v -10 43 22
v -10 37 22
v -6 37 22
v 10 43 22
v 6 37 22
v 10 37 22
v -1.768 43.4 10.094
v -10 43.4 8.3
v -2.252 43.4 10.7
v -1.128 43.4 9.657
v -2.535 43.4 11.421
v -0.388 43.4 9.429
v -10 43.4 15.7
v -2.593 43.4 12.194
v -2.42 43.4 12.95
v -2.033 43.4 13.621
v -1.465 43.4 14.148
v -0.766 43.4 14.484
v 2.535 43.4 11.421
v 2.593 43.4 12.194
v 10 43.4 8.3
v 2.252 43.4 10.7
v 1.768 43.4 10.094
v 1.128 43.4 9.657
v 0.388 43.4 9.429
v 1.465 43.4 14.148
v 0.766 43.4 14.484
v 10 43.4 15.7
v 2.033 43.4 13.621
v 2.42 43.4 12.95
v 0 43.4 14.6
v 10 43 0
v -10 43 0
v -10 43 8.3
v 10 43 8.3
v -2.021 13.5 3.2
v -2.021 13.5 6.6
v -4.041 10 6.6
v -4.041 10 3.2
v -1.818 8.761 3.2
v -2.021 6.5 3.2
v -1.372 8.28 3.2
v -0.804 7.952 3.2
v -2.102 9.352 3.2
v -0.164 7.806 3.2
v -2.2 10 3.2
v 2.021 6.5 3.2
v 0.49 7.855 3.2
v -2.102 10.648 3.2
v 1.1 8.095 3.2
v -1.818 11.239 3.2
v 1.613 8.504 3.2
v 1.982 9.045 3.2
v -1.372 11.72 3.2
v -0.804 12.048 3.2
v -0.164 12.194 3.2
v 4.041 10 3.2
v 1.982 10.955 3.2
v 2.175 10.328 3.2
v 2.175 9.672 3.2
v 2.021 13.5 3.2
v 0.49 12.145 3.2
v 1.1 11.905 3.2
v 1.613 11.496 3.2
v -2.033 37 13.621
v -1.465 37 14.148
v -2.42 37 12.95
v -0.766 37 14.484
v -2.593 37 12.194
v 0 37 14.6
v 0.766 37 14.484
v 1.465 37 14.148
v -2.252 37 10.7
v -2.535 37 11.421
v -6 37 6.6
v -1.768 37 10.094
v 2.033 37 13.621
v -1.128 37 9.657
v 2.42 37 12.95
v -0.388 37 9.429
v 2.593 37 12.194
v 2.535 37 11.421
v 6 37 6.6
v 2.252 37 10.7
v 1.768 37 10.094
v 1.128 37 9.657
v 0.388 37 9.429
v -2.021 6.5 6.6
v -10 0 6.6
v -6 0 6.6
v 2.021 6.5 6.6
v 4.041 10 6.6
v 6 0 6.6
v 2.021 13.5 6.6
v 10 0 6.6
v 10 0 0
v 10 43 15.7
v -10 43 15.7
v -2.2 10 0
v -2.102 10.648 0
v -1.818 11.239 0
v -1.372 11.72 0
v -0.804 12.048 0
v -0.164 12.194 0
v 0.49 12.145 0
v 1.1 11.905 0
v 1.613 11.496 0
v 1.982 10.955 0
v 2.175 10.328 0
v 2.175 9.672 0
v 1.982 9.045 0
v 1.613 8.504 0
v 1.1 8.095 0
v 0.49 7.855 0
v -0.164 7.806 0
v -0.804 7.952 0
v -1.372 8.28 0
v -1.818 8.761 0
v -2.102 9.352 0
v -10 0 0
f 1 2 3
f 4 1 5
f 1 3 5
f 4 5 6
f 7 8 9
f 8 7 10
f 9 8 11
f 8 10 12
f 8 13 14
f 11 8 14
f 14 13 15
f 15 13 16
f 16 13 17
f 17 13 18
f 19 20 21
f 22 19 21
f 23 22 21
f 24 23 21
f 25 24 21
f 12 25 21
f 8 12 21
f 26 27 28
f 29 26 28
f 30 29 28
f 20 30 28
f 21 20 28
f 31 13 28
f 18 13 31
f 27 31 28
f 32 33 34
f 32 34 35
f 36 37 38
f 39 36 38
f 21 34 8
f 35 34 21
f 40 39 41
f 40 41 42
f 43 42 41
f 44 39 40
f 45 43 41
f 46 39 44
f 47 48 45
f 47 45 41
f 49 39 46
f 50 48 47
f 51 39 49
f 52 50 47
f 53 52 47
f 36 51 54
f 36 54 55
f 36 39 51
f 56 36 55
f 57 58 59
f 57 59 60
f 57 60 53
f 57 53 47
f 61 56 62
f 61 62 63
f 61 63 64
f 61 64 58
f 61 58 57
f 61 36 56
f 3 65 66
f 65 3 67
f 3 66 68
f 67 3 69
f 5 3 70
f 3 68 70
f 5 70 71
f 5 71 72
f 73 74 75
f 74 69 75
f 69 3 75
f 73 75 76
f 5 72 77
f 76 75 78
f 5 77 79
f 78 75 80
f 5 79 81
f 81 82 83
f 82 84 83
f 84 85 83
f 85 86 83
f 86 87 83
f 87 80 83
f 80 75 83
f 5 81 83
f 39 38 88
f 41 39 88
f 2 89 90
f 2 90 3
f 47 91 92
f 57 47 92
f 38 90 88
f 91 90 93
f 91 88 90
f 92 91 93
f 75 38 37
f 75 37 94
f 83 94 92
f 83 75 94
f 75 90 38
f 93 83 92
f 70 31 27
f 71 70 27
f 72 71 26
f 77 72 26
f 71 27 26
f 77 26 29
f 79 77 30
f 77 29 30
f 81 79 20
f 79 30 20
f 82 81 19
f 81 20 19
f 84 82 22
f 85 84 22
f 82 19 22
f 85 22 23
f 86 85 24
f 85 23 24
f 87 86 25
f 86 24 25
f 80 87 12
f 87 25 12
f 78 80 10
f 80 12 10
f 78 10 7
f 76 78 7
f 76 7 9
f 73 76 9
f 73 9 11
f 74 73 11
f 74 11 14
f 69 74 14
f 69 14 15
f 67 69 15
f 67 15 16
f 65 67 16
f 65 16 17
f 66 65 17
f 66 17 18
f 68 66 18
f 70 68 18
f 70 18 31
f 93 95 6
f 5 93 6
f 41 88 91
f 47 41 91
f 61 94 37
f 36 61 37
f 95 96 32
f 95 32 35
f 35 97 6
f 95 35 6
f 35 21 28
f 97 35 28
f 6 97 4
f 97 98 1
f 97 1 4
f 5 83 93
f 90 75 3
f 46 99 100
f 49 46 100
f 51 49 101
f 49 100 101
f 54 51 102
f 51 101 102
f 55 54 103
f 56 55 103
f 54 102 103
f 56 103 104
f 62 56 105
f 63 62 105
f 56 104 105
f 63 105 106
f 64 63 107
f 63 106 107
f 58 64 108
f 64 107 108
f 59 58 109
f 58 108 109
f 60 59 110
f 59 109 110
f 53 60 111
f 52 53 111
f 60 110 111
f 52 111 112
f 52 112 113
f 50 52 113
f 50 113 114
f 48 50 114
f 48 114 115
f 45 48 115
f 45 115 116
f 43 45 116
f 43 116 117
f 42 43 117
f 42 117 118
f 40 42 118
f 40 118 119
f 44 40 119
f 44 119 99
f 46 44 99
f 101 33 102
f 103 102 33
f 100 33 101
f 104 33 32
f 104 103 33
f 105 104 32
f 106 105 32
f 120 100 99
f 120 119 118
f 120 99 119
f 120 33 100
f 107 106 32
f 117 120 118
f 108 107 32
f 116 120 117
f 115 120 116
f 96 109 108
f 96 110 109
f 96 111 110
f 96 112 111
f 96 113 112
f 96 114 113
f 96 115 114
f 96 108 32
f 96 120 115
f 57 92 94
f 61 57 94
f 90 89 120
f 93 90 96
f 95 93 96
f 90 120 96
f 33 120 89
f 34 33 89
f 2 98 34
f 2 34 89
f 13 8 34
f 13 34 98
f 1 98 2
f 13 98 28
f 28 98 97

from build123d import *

# Parameters (mm, degrees)
SKETCH_3_W          = 20
SKETCH_3_H          = 37
EXTRUDE_2_DEPTH     = 6.6
SKETCH_10_R         = 2.2
CUT_EXTRUDE_3_DEPTH = 39.891644347
CUT_EXTRUDE_2_DEPTH = 3.4
SKETCH_11_W         = 20
SKETCH_11_H         = 22
EXTRUDE_5_DEPTH     = 6
SKETCH_9_W          = 20
SKETCH_9_H          = 7.4
EXTRUDE_4_DEPTH     = 0.4
SKETCH_13_R         = 2.6
CUT_EXTRUDE_4_DEPTH = 50.674540763
EXTRUDE_6_DEPTH     = 4


with BuildPart() as part:
    # Эскиз3 → Бобышка-Вытянуть2 (new body)
    with BuildSketch(Plane.XY):
        with Locations((0, 18.5)):
            Rectangle(SKETCH_3_W, SKETCH_3_H)
    extrude(amount=EXTRUDE_2_DEPTH)

    # Эскиз10 → Вырез-Вытянуть3 (cut, through all)
    with BuildSketch(Plane(origin=(0, 0, 0), x_dir=(-1, 0, 0), z_dir=(0, 0, -1))):
        with Locations((0, 10)):
            Circle(SKETCH_10_R)
    extrude(amount=-CUT_EXTRUDE_3_DEPTH, mode=Mode.SUBTRACT)

    # Эскиз6 → Вырез-Вытянуть2 (cut)
    with BuildSketch(Plane.XY.offset(6.6)):
        Polygon((4.041451884, 10), (2.020725942, 13.5), (-2.020725942, 13.5), (-4.041451884, 10), (-2.020725942, 6.5), (2.020725942, 6.5), align=None)
    extrude(amount=-CUT_EXTRUDE_2_DEPTH, mode=Mode.SUBTRACT)

    # Эскиз11 → Бобышка-Вытянуть5 (add)
    with BuildSketch(Plane(origin=(0, 37, 0), x_dir=(1, 0, 0), z_dir=(0, 1, 0))):
        with Locations((0, -11)):
            Rectangle(SKETCH_11_W, SKETCH_11_H)
    extrude(amount=EXTRUDE_5_DEPTH)

    # Эскиз9 → Бобышка-Вытянуть4 (add)
    with BuildSketch(Plane(origin=(0, 43, -43.4), x_dir=(1, 0, 0), z_dir=(0, -1, 0))):
        with Locations((0, 55.4)):
            Rectangle(SKETCH_9_W, SKETCH_9_H)
    extrude(amount=-EXTRUDE_4_DEPTH)

    # Эскиз13 → Вырез-Вытянуть4 (cut, through all)
    with BuildSketch(Plane(origin=(0, 43.4, 0), x_dir=(1, 0, 0), z_dir=(0, 1, 0))):
        with Locations(Location((0, -12, 0), (0, 0, 270))):
            Circle(SKETCH_13_R)
    extrude(amount=-CUT_EXTRUDE_4_DEPTH, mode=Mode.SUBTRACT)

    # Эскиз17 → Бобышка-Вытянуть6 (add)
    with BuildSketch(Plane.ZY.offset(10)):
        Polygon((22, 37), (6.6, 37), (6.6, 0), align=None)
    extrude_6 = extrude(amount=-EXTRUDE_6_DEPTH)

    # Зеркальное отражение1: Бобышка-Вытянуть6 across plane
    add(extrude_6.mirror(Plane(origin=(0, 0, 0), x_dir=(0, 0, 1), z_dir=(1, 0, 0))))


solid = part.part
